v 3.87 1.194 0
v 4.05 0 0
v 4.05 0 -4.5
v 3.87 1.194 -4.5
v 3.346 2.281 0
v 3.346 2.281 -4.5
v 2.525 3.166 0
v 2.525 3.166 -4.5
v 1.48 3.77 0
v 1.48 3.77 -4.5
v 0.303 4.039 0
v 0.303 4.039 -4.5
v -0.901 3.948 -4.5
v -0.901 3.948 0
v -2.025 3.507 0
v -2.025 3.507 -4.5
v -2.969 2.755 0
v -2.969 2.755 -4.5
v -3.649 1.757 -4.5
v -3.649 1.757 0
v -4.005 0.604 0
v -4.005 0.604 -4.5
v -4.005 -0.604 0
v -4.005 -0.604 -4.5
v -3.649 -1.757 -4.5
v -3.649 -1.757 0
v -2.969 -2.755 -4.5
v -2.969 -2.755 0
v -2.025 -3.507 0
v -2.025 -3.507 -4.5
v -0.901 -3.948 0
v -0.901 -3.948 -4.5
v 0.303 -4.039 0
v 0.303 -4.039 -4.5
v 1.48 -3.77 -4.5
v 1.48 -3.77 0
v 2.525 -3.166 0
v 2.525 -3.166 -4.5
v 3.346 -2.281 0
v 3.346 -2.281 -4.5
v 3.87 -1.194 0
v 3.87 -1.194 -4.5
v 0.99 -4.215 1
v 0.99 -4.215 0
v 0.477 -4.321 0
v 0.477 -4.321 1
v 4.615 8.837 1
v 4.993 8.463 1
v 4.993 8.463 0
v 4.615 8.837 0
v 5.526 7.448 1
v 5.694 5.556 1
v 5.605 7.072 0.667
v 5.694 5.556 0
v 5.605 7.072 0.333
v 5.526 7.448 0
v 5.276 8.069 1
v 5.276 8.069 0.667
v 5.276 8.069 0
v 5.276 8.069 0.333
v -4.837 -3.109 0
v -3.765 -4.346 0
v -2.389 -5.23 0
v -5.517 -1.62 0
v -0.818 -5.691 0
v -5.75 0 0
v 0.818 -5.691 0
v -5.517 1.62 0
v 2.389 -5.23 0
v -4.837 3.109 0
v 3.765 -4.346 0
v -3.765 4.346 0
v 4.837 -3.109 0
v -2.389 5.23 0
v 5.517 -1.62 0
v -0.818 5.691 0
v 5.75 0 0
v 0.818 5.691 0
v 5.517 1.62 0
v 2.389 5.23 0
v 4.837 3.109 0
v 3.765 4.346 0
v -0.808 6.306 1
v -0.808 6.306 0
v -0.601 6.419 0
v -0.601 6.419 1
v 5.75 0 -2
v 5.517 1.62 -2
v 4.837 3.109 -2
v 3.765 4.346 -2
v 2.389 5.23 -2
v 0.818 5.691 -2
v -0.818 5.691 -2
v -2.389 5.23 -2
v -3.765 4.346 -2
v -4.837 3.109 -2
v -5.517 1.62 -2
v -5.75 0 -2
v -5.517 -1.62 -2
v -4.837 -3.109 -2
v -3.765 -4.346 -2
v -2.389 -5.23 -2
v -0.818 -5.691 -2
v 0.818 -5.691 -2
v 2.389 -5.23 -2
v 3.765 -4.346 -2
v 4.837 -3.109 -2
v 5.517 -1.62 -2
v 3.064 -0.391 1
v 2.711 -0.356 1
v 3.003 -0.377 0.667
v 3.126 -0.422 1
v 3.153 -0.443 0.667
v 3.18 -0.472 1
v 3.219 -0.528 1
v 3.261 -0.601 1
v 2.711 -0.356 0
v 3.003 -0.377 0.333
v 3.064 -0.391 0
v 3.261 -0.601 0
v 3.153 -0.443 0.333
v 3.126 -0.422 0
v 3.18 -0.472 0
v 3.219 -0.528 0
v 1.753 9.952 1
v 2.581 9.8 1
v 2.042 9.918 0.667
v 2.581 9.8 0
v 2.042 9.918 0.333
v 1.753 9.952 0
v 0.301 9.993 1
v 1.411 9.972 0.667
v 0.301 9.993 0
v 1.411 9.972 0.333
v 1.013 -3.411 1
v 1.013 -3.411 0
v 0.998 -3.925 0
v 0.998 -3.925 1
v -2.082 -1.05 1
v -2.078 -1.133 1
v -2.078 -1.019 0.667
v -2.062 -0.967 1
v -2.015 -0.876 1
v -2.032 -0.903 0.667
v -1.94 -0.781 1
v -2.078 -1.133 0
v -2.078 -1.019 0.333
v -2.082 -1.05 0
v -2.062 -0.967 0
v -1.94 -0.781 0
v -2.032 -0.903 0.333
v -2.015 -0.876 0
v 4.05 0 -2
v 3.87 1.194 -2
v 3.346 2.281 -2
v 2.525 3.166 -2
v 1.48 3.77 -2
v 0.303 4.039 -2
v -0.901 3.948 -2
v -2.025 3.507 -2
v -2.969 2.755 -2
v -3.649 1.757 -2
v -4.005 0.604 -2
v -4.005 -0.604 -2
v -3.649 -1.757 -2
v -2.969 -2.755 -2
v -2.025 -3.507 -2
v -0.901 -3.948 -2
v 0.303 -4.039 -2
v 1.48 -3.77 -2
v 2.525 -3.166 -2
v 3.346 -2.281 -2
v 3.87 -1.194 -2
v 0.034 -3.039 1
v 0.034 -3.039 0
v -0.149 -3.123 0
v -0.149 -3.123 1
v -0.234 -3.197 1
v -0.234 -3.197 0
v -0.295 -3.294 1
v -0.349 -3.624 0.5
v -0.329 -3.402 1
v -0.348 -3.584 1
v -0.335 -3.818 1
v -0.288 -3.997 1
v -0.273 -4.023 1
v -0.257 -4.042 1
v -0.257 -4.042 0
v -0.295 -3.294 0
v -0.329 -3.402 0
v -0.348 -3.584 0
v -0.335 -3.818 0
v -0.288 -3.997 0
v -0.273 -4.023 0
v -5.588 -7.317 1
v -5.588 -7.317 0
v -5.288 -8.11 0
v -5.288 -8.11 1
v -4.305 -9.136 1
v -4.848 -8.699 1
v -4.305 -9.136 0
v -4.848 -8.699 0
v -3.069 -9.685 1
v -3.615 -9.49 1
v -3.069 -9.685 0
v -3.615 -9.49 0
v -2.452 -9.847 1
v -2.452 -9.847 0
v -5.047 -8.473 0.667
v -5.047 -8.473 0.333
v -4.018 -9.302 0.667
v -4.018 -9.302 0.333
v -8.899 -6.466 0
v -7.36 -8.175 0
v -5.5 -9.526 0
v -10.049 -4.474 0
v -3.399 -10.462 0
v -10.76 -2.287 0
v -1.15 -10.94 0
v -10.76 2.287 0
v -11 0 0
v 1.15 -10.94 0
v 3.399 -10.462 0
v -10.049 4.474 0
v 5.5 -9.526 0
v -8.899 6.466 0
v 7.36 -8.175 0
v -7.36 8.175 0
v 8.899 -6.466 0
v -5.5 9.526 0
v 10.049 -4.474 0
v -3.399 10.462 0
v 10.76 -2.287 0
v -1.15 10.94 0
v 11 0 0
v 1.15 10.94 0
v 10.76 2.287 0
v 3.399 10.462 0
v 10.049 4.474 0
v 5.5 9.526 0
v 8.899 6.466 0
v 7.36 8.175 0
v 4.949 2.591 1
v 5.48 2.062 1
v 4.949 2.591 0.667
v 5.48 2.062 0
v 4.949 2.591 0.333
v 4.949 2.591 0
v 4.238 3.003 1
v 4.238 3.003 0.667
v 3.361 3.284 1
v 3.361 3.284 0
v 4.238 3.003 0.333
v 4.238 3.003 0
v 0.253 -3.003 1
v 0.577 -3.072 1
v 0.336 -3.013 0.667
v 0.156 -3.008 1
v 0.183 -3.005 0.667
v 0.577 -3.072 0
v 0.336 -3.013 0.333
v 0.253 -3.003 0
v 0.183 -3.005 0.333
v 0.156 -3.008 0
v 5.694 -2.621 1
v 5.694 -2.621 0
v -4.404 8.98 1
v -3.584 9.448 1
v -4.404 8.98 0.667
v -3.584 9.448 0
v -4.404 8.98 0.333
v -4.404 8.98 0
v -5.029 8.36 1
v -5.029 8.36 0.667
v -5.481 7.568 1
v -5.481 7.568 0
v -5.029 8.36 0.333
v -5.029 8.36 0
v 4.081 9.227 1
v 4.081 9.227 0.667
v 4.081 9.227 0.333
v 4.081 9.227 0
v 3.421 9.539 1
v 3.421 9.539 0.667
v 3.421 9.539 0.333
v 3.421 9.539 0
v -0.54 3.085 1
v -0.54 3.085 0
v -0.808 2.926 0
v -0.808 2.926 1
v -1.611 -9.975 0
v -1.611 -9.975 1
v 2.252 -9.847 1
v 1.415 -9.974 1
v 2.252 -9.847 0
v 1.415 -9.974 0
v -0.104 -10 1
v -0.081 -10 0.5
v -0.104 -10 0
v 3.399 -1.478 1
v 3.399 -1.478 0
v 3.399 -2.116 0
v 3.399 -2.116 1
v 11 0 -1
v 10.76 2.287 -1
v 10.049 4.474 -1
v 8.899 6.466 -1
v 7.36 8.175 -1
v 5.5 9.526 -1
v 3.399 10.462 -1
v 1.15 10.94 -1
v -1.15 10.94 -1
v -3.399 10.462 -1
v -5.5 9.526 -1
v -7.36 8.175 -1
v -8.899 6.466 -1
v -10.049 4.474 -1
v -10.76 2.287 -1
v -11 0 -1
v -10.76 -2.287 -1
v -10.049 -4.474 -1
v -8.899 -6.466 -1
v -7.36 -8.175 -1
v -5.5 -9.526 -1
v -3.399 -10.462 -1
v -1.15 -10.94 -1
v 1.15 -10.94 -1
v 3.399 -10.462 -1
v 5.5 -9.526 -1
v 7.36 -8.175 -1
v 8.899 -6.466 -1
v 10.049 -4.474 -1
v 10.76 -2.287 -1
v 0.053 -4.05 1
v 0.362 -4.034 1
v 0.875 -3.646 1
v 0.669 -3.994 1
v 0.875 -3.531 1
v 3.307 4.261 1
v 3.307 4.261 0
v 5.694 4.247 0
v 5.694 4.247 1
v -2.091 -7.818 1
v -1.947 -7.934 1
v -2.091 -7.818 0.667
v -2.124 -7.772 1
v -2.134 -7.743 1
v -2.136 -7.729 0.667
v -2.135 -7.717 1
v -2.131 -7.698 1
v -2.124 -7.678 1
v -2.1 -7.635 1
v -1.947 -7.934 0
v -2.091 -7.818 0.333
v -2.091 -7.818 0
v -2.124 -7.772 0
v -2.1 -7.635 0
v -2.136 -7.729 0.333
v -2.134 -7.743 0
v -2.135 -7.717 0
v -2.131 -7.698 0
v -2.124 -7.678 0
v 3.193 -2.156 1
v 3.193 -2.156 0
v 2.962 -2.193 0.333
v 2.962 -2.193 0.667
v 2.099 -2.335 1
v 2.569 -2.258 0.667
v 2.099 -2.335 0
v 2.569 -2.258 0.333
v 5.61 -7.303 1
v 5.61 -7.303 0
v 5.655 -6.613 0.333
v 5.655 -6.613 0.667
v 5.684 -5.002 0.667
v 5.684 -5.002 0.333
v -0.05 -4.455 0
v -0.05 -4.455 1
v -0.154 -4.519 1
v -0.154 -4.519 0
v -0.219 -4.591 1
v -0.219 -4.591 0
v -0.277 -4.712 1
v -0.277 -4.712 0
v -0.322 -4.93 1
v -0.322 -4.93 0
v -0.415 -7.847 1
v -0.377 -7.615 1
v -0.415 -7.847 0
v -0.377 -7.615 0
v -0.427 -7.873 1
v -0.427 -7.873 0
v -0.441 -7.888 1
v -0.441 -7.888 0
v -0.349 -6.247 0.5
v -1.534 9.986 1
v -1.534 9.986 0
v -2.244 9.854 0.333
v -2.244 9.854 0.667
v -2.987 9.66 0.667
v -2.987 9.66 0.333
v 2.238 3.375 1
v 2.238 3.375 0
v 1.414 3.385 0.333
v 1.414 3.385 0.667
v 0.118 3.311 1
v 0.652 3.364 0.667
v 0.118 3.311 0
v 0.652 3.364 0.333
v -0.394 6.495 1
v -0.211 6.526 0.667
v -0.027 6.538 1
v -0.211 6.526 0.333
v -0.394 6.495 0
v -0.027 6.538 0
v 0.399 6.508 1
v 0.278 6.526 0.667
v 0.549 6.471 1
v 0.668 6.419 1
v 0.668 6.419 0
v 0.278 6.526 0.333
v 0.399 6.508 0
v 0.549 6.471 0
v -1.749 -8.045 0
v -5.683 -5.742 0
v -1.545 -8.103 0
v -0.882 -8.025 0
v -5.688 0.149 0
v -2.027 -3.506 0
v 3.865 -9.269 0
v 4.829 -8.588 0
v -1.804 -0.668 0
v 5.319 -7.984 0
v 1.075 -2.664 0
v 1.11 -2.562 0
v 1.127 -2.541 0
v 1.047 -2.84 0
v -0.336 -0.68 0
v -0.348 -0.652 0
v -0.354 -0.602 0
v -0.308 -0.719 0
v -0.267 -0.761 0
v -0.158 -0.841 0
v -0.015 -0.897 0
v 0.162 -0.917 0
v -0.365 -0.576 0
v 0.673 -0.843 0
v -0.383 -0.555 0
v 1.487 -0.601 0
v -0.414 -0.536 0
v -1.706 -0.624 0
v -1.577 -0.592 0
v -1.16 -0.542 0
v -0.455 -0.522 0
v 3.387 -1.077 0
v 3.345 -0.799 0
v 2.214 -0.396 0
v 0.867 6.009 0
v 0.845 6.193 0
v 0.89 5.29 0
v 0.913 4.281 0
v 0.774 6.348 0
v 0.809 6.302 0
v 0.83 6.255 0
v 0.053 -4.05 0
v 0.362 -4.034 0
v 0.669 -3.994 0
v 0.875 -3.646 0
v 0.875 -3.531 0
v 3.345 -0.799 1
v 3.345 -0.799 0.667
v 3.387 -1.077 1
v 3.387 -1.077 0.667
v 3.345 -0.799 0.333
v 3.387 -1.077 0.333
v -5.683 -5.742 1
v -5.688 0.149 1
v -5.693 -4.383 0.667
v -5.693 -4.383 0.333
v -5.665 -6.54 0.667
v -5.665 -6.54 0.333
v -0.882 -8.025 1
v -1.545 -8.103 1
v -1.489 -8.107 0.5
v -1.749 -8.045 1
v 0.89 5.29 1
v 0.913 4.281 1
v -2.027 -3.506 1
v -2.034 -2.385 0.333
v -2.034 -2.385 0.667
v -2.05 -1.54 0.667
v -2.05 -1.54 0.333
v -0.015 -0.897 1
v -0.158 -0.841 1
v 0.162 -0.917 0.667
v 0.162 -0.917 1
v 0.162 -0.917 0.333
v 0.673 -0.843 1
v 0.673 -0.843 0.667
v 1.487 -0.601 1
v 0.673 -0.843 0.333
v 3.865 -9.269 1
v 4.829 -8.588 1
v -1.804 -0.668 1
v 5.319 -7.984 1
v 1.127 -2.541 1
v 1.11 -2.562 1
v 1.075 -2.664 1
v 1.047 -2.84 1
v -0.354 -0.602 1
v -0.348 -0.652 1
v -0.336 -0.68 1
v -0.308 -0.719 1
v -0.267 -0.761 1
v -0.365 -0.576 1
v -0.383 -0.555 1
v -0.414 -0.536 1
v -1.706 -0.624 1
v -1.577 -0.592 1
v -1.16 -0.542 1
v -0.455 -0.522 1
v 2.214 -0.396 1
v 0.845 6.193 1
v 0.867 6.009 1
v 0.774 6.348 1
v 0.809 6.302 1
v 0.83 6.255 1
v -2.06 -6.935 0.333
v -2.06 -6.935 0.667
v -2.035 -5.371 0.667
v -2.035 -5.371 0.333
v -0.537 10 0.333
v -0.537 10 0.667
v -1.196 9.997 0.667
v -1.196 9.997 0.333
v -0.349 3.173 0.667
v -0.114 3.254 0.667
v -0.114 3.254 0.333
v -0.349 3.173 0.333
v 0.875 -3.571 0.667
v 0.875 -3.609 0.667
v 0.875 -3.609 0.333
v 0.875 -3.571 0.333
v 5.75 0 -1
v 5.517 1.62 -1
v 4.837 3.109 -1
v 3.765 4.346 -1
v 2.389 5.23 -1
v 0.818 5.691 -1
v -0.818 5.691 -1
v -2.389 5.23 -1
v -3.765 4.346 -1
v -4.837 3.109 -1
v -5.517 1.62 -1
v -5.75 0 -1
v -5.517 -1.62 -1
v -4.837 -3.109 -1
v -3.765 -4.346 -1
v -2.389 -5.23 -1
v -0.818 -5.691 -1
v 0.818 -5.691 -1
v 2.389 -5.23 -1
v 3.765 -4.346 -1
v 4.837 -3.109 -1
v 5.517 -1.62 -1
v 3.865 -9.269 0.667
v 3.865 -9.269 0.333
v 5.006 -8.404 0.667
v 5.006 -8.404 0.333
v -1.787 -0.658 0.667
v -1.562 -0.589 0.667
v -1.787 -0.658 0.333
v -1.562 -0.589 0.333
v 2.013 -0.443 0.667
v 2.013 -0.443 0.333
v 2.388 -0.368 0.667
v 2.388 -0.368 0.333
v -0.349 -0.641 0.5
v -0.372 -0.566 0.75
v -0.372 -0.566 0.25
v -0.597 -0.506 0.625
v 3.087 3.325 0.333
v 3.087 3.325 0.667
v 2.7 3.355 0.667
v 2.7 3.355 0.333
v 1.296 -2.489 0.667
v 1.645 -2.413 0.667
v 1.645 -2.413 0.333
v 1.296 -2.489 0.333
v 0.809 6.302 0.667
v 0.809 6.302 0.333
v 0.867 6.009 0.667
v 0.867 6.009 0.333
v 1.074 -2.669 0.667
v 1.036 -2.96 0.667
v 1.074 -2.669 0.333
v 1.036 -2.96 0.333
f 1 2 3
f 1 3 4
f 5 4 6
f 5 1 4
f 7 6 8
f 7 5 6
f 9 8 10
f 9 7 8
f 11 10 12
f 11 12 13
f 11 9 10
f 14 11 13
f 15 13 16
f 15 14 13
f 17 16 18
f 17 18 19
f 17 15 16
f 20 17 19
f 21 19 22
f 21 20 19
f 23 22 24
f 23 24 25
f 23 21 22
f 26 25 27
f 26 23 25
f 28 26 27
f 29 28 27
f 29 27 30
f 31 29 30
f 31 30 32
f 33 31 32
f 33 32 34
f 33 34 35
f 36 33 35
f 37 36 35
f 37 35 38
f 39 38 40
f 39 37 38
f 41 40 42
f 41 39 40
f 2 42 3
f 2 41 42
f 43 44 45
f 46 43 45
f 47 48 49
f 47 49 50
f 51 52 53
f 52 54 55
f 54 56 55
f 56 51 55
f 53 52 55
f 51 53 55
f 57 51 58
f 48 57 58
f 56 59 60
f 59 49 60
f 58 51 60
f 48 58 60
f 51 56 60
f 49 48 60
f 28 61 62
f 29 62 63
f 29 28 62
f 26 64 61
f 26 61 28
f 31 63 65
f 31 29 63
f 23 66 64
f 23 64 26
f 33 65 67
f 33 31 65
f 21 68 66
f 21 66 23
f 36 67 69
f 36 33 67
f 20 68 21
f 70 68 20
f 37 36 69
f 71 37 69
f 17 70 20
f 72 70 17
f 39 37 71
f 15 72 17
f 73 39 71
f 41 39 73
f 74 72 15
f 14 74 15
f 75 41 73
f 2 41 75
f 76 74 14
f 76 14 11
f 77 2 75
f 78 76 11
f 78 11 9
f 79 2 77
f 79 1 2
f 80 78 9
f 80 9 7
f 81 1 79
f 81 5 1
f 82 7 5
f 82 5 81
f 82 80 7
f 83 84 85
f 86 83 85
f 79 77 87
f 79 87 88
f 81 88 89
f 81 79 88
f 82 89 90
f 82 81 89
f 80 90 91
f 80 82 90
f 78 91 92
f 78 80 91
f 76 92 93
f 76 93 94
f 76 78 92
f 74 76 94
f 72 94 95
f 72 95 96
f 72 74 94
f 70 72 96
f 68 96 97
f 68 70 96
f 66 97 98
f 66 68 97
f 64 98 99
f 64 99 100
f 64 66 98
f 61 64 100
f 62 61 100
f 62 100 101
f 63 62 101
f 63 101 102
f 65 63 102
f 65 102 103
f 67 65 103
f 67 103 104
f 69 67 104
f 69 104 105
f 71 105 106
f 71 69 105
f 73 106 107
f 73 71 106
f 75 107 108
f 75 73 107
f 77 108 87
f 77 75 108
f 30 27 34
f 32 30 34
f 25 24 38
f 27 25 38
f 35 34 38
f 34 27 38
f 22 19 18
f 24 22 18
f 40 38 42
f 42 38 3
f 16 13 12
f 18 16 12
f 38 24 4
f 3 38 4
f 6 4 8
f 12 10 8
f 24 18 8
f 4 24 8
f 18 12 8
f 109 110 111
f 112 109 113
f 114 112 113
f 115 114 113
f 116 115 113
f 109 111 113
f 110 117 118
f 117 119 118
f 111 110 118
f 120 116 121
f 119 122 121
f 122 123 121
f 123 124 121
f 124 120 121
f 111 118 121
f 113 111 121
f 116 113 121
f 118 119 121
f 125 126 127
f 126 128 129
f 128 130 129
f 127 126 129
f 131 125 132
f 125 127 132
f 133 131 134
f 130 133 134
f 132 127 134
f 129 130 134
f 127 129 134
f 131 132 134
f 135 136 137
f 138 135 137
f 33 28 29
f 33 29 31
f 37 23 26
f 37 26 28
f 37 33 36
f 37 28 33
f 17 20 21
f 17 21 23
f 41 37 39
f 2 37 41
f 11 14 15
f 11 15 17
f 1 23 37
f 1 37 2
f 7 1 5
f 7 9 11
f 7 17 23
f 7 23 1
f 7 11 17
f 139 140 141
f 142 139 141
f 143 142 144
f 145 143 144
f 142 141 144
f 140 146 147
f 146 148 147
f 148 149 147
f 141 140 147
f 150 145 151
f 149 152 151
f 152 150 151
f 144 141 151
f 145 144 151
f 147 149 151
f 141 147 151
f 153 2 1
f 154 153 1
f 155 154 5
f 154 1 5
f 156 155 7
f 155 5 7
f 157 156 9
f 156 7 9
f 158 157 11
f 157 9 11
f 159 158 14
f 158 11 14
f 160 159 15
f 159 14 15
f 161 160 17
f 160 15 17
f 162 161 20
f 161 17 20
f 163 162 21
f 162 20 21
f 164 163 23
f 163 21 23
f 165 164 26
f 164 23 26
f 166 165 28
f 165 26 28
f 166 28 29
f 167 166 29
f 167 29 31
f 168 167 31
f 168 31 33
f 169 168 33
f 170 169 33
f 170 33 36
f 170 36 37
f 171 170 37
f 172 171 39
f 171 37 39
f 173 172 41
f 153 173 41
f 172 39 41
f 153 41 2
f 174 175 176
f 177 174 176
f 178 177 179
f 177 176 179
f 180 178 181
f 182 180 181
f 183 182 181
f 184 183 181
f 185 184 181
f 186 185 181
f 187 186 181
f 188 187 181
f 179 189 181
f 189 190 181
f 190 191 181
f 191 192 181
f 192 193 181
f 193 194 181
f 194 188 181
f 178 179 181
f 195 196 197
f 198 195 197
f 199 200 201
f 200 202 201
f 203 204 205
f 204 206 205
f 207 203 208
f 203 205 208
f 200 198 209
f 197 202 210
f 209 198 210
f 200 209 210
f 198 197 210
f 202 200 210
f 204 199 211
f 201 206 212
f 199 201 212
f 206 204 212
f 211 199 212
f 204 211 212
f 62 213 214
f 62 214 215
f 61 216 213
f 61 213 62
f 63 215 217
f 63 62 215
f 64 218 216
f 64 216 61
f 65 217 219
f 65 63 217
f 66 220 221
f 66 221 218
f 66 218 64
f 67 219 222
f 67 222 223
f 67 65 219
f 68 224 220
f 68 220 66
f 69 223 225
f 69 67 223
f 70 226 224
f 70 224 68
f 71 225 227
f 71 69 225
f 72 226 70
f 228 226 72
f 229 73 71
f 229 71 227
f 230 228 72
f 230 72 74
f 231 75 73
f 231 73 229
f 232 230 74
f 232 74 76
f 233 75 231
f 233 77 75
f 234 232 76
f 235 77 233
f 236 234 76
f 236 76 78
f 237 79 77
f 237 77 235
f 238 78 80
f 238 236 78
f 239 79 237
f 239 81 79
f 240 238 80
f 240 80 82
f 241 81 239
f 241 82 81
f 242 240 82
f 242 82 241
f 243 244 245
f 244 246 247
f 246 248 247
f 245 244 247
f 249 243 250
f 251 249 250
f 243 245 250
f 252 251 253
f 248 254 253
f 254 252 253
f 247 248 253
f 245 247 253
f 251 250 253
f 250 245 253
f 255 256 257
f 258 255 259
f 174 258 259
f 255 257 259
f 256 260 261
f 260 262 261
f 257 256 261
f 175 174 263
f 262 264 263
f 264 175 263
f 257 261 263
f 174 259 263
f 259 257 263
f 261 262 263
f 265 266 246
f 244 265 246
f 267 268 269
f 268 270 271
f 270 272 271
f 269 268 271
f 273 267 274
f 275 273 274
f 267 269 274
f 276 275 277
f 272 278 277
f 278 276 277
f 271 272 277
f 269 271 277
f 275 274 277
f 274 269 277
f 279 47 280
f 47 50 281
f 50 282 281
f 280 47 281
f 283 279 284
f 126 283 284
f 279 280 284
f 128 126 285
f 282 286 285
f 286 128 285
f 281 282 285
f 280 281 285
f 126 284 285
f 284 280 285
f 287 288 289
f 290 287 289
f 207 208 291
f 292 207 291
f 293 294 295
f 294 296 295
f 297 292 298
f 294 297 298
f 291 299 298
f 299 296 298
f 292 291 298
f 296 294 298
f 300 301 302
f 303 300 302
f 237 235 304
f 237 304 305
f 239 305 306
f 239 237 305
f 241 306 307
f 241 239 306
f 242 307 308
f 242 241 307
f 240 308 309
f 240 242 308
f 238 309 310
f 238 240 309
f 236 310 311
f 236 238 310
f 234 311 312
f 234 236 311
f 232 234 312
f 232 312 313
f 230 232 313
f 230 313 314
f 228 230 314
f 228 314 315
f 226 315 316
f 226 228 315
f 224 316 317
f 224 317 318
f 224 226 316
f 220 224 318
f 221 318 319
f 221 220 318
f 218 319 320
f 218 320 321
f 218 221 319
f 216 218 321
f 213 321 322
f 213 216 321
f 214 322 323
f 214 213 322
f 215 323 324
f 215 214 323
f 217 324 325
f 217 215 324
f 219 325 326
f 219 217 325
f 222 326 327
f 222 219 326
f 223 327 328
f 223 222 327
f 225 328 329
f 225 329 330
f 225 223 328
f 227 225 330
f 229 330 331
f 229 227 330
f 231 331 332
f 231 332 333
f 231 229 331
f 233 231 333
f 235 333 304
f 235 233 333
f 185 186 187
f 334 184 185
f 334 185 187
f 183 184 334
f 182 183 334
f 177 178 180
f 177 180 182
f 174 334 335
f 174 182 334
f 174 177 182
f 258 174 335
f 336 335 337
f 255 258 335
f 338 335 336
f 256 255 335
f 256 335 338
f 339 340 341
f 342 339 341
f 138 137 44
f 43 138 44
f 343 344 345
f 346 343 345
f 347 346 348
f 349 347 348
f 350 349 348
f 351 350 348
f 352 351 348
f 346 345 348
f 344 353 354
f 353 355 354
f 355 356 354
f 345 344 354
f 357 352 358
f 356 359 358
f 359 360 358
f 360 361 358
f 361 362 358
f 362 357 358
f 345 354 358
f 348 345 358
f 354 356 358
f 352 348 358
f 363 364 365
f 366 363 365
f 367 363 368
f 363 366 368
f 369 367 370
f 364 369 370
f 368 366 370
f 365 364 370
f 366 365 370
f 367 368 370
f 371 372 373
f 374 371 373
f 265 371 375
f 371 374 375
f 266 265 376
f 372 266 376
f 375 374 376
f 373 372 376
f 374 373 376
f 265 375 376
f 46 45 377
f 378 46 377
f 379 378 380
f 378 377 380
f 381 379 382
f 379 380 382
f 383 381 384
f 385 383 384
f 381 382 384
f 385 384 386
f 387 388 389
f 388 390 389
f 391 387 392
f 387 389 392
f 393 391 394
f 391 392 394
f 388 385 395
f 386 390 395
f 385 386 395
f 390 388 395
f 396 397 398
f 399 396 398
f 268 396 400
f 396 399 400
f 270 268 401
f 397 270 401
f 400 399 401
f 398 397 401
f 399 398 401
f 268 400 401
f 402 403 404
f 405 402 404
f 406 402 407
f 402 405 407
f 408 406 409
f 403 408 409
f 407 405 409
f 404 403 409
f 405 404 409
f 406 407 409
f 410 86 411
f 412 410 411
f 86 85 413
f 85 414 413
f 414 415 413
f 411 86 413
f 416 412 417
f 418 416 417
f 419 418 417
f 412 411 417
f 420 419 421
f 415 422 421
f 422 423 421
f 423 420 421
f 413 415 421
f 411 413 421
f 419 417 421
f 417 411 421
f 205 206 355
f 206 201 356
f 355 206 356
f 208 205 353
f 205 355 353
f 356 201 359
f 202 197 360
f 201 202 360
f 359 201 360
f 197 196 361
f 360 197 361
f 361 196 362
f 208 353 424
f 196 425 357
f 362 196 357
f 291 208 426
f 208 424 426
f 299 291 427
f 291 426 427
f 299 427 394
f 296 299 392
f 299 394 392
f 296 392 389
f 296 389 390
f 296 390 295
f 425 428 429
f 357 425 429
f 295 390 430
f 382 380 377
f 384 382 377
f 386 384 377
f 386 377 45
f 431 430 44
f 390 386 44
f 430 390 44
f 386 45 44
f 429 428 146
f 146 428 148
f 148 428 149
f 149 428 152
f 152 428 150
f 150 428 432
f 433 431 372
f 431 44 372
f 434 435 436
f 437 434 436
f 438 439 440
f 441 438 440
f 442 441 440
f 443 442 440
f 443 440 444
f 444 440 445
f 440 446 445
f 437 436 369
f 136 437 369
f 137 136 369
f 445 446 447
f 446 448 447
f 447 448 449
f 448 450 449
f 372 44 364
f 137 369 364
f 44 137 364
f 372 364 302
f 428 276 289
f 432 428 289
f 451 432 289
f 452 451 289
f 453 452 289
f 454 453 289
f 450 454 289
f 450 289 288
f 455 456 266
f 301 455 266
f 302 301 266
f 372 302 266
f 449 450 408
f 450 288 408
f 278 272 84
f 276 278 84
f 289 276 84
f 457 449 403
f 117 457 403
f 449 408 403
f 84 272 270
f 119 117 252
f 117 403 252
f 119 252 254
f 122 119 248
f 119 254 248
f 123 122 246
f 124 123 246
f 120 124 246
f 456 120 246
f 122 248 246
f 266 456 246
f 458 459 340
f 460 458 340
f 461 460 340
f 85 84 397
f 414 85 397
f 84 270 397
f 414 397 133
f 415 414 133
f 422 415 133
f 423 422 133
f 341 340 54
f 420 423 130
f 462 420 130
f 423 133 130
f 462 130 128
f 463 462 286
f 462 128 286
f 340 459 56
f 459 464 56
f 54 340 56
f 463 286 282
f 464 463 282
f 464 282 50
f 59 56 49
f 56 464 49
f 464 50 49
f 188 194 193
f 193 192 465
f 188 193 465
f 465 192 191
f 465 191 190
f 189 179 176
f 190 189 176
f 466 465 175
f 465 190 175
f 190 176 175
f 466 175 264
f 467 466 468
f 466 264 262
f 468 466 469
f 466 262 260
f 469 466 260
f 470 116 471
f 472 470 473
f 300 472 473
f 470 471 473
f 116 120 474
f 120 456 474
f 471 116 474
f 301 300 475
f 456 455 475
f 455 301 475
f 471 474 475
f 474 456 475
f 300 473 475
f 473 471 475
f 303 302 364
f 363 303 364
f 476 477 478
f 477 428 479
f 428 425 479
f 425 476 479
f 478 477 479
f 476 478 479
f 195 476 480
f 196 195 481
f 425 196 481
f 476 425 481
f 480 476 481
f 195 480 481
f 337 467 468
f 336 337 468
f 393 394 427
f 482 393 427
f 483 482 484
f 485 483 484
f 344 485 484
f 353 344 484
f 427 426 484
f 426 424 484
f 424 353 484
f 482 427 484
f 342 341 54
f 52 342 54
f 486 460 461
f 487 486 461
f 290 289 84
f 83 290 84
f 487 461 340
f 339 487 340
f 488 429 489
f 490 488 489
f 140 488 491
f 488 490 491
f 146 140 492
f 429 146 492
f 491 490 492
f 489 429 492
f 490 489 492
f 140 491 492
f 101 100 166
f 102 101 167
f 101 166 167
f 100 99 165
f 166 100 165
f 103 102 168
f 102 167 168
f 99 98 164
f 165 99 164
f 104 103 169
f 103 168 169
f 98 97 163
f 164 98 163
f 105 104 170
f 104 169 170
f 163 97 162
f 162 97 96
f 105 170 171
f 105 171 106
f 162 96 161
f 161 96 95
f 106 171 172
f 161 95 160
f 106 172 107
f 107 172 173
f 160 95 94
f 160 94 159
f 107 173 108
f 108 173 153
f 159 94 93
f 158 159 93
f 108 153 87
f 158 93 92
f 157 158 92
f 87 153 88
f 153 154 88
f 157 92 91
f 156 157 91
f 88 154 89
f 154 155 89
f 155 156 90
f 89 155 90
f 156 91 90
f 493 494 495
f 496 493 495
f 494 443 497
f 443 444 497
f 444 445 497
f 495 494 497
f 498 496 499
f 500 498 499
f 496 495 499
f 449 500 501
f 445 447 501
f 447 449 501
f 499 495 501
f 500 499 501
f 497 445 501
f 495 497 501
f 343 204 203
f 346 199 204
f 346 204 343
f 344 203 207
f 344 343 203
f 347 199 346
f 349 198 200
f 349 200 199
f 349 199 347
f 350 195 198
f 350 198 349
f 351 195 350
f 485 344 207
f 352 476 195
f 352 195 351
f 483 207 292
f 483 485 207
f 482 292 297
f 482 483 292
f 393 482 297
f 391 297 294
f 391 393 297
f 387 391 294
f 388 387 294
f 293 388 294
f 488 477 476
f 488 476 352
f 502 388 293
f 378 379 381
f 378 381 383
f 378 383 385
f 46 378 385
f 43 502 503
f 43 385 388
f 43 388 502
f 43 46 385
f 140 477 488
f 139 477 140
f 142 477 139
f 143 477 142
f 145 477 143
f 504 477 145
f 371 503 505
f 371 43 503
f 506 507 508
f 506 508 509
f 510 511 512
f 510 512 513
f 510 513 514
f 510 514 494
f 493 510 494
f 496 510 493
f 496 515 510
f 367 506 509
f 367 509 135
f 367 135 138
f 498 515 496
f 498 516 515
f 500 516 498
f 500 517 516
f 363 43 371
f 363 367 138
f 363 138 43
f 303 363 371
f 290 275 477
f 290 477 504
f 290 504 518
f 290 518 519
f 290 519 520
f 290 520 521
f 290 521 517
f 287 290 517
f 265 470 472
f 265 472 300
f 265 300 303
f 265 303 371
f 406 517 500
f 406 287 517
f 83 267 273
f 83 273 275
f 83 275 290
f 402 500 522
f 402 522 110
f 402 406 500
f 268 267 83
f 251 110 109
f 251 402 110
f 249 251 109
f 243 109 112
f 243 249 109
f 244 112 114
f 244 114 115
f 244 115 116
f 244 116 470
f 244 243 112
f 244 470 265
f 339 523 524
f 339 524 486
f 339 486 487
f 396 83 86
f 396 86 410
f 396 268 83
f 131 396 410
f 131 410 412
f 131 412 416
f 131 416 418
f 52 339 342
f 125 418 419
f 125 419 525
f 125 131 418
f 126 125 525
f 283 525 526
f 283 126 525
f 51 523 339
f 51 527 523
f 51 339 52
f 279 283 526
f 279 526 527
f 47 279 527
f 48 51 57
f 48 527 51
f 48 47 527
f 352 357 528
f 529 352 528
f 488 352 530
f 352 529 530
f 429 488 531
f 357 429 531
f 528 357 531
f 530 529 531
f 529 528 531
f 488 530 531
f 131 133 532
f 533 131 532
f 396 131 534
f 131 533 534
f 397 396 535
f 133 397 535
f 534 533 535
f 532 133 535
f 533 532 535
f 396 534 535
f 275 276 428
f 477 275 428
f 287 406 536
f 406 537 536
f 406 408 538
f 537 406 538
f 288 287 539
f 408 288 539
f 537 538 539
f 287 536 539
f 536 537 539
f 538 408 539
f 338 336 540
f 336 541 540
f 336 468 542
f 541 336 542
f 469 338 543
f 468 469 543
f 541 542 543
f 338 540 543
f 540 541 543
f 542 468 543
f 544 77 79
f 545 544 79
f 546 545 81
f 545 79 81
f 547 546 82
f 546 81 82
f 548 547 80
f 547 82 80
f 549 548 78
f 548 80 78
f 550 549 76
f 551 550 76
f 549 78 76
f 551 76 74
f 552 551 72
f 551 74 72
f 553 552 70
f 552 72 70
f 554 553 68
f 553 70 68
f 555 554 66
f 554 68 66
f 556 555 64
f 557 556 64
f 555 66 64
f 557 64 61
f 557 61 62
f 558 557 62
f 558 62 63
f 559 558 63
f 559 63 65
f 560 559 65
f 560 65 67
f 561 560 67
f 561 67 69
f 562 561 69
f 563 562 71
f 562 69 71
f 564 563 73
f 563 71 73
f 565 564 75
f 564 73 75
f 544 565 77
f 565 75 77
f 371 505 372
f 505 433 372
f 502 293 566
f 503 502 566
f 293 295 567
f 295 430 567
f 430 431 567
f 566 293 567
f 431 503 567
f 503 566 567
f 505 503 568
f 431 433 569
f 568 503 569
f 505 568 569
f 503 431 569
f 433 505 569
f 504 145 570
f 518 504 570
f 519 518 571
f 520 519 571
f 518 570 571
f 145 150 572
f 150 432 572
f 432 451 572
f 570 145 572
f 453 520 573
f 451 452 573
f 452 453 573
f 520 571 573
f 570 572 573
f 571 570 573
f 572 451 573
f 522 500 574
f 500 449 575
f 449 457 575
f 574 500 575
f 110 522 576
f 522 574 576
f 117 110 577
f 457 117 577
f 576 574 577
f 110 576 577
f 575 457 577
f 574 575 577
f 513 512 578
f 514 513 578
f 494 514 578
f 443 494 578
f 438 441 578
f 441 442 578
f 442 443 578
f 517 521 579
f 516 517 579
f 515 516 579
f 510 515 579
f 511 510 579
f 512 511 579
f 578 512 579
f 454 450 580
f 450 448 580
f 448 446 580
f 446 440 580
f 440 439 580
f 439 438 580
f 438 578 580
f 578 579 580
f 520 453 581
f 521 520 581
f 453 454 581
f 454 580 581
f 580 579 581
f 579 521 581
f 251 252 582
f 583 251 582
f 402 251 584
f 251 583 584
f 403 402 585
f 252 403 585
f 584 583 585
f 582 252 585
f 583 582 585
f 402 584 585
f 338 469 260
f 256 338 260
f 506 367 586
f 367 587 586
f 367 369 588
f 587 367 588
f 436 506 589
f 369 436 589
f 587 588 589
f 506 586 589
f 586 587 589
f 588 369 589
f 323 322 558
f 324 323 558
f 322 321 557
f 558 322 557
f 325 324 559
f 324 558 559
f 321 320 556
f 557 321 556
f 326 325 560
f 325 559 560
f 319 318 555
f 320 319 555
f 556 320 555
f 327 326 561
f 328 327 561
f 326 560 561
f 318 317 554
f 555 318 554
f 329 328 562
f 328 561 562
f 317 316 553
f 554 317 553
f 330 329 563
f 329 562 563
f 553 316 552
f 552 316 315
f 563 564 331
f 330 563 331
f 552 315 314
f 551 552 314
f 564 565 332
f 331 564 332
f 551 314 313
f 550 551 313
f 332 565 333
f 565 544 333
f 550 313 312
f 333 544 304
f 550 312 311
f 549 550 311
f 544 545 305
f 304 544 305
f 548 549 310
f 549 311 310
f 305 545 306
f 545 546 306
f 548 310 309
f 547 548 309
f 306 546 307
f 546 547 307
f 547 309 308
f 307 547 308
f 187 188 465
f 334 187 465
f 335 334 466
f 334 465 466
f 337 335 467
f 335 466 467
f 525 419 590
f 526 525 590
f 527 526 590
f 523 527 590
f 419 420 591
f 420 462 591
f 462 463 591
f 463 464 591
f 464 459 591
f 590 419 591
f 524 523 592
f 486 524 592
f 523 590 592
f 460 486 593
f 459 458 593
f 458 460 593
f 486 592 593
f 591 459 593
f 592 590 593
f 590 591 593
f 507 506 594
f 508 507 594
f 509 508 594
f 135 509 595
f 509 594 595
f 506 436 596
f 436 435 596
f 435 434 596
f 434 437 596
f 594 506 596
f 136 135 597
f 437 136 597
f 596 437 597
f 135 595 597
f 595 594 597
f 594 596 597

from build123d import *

# Parameters (mm, degrees)
F0_R     = 5.75
F0_R_2   = 4.05
F1_DEPTH = 2
F0_R_3   = 11
F2_DEPTH = 1
F3_DEPTH = 4.5
F5_DEPTH = 1


with BuildPart() as f1:
    # F0 (on Top) → F1 (new body)
    with BuildSketch(Plane.XY):
        Circle(F0_R)
        Circle(F0_R_2, mode=Mode.SUBTRACT)
    extrude(amount=-F1_DEPTH)


with BuildPart() as f2:
    # F0 (on Top) → F2 (new body)
    with BuildSketch(Plane.XY):
        Circle(F0_R_3)
        Circle(F0_R, mode=Mode.SUBTRACT)
    extrude(amount=-F2_DEPTH)


with BuildPart() as f3:
    # F0 (on Top) → F3 (new body)
    with BuildSketch(Plane.XY):
        Circle(F0_R_2)
    extrude(amount=-F3_DEPTH)


with BuildPart() as f5:
    # F4 (on face) → F5 (new body)
    with BuildSketch(Plane.XY):
        with BuildLine():
            add(Edge.make_bspline(
                [(-3.584369, 9.448104), (-4.509891, 9.049578), (-5.106509, 8.451788), (-5.481308, 7.568387)],
                knots=[0, 0, 0, 0, 1, 1, 1, 1], degree=3))
            Line((-5.481308, 7.568387), (-5.687829, 0.149149))
            add(Edge.make_bspline(
                [(-5.687829, 0.149149), (-5.703127, -5.901815), (-5.695478, -6.898131), (-5.588393, -7.316584)],
                knots=[0, 0, 0, 0, 1, 1, 1, 1], degree=3))
            add(Edge.make_bspline(
                [(-5.588393, -7.316584), (-5.274786, -8.651649), (-4.30337, -9.428776), (-2.452324, -9.847229)],
                knots=[0, 0, 0, 0, 1, 1, 1, 1], degree=3))
            add(Edge.make_bspline(
                [(-2.452324, -9.847229), (-1.83276, -9.986713), (-1.595642, -9.999997), (-0.081151, -9.999997)],
                knots=[0, 0, 0, 0, 1, 1, 1, 1], degree=3))
            add(Edge.make_bspline(
                [(-0.081151, -9.999997), (1.418043, -9.999997), (1.670458, -9.980071), (2.251778, -9.847229)],
                knots=[0, 0, 0, 0, 1, 1, 1, 1], degree=3))
            add(Edge.make_bspline(
                [(2.251778, -9.847229), (4.079877, -9.428776), (5.29606, -8.505522), (5.609666, -7.3033)],
                knots=[0, 0, 0, 0, 1, 1, 1, 1], degree=3))
            add(Edge.make_bspline(
                [(5.609666, -7.3033), (5.663209, -7.123963), (5.693805, -5.337235), (5.693805, -2.620612)],
                knots=[0, 0, 0, 0, 1, 1, 1, 1], degree=3))
            Line((5.693805, -2.620612), (5.479634, 2.062077))
            add(Edge.make_bspline(
                [(5.479634, 2.062077), (5.043644, 2.646583), (4.316994, 3.071678), (3.360876, 3.284225)],
                knots=[0, 0, 0, 0, 1, 1, 1, 1], degree=3))
            add(Edge.make_bspline(
                [(3.360876, 3.284225), (3.1553689934, 3.3294673822), (2.7253242209, 3.360442913), (2.238191116, 3.3753519118)],
                knots=[0, 0, 0, 0, 0.378413675, 0.378413675, 0.378413675, 0.378413675], degree=3))
            ThreePointArc((2.238191116, 3.3753519118), (3.5684151958, 1.9154406778), (4.05, 0))
            ThreePointArc((4.05, 0), (3.1972082334, -2.4860328864), (0.9979706111, -3.9251184262))
            Line((0.9979706111, -3.9251184262), (0.989702, -4.214718))
            Line((0.989702, -4.214718), (0.477223, -4.320992))
            add(Edge.make_bspline(
                [(0.477223, -4.320992), (-0.387109, -4.500329), (-0.348864, -4.420624), (-0.348864, -6.247204)],
                knots=[0, 0, 0, 0, 1, 1, 1, 1], degree=3))
            add(Edge.make_bspline(
                [(-0.348864, -6.247204), (-0.348864, -7.4295), (-0.371811, -7.841311), (-0.440651, -7.887806)],
                knots=[0, 0, 0, 0, 1, 1, 1, 1], degree=3))
            add(Edge.make_bspline(
                [(-0.440651, -7.887806), (-0.570683, -7.974153), (-1.197897, -8.106996), (-1.488557, -8.106996)],
                knots=[0, 0, 0, 0, 1, 1, 1, 1], degree=3))
            add(Edge.make_bspline(
                [(-1.488557, -8.106996), (-1.618589, -8.106996), (-1.809813, -8.033932), (-1.947494, -7.934301)],
                knots=[0, 0, 0, 0, 1, 1, 1, 1], degree=3))
            add(Edge.make_bspline(
                [(-1.947494, -7.934301), (-2.146366, -7.794816), (-2.169313, -7.74168), (-2.100473, -7.635406)],
                knots=[0, 0, 0, 0, 1, 1, 1, 1], degree=3))
            add(Edge.make_bspline(
                [(-2.100473, -7.635406), (-2.0543800597, -7.5553552956), (-2.0249525069, -5.3335056257), (-2.0272542069, -3.5061004522)],
                knots=[0, 0, 0, 0, 0.6026008669, 0.6026008669, 0.6026008669, 0.6026008669], degree=3))
            ThreePointArc((-2.0272542069, -3.5061004522), (-3.9971554901, 0.652110411), (-0.807801, 3.9686216177))
            Line((-0.807801, 3.9686216177), (-0.807801, 4.612647))
            Line((-0.807801, 4.612647), (-0.807801, 6.306386))
            Line((-0.807801, 6.306386), (-0.601279, 6.419302))
            add(Edge.make_bspline(
                [(-0.601279, 6.419302), (-0.325917, 6.578712), (0.393084, 6.578712), (0.668446, 6.419302)],
                knots=[0, 0, 0, 0, 1, 1, 1, 1], degree=3))
            add(Edge.make_bspline(
                [(0.668446, 6.419302), (0.867319, 6.306386), (0.867319, 6.306386), (0.890266, 5.290143)],
                knots=[0, 0, 0, 0, 1, 1, 1, 1], degree=3))
            Line((0.890266, 5.290143), (5.693805, 5.555827))
            add(Edge.make_bspline(
                [(5.693805, 5.555827), (5.693805, 7.428903), (5.471985, 8.086472), (4.615303, 8.83703)],
                knots=[0, 0, 0, 0, 1, 1, 1, 1], degree=3))
            add(Edge.make_bspline(
                [(4.615303, 8.83703), (4.125771, 9.27541), (3.529153, 9.554378), (2.580683, 9.800136)],
                knots=[0, 0, 0, 0, 1, 1, 1, 1], degree=3))
            add(Edge.make_bspline(
                [(2.580683, 9.800136), (1.961118, 9.959547), (1.777544, 9.979473), (0.301297, 9.992758)],
                knots=[0, 0, 0, 0, 1, 1, 1, 1], degree=3))
            add(Edge.make_bspline(
                [(0.301297, 9.992758), (-0.578332, 10.006042), (-1.404419, 9.9994), (-1.534451, 9.986116)],
                knots=[0, 0, 0, 0, 1, 1, 1, 1], degree=3))
            add(Edge.make_bspline(
                [(-1.534451, 9.986116), (-2.169313, 9.899768), (-3.117783, 9.65401), (-3.584369, 9.448104)],
                knots=[0, 0, 0, 0, 1, 1, 1, 1], degree=3))
        make_face()
        Polygon((5.693805, 4.247331), (5.693805, 5.555827), (0.890266, 5.290143), (0.913213, 4.280542), (3.307333, 4.260616), align=None)
        with BuildLine():
            ThreePointArc((4.05, 0), (3.5684151958, 1.9154406778), (2.238191116, 3.3753519118))
            add(Edge.make_bspline(
                [(2.238191116, 3.3753519118), (1.4380210999, 3.3998415916), (0.4838170762, 3.3809810415), (0.117722, 3.310794)],
                knots=[0.378413675, 0.378413675, 0.378413675, 0.378413675, 1, 1, 1, 1], degree=3))
            add(Edge.make_bspline(
                [(0.117722, 3.310794), (-0.096449, 3.270941), (-0.387109, 3.171309), (-0.540087, 3.084962)],
                knots=[0, 0, 0, 0, 1, 1, 1, 1], degree=3))
            Line((-0.540087, 3.084962), (-0.807801, 2.925551))
            Line((-0.807801, 2.925551), (-0.807801, 3.9686216177))
            ThreePointArc((-0.807801, 3.9686216177), (-3.9971554901, 0.652110411), (-2.0272542069, -3.5061004522))
            add(Edge.make_bspline(
                [(-2.0272542069, -3.5061004522), (-2.0287721164, -2.3009756809), (-2.0440892343, -1.2673967641), (-2.077526, -1.132779)],
                knots=[0.6026008669, 0.6026008669, 0.6026008669, 0.6026008669, 1, 1, 1, 1], degree=3))
            add(Edge.make_bspline(
                [(-2.077526, -1.132779), (-2.100473, -1.019863), (-2.054579, -0.906947), (-1.939845, -0.780747)],
                knots=[0, 0, 0, 0, 1, 1, 1, 1], degree=3))
            add(Edge.make_bspline(
                [(-1.939845, -0.780747), (-1.786866, -0.621336), (-1.68743, -0.588126), (-1.159652, -0.541631)],
                knots=[0, 0, 0, 0, 1, 1, 1, 1], degree=3))
            add(Edge.make_bspline(
                [(-1.159652, -0.541631), (-0.509492, -0.47521), (-0.348864, -0.495136), (-0.348864, -0.641263)],
                knots=[0, 0, 0, 0, 1, 1, 1, 1], degree=3))
            add(Edge.make_bspline(
                [(-0.348864, -0.641263), (-0.348864, -0.687757), (-0.264725, -0.780747), (-0.15764, -0.840526)],
                knots=[0, 0, 0, 0, 1, 1, 1, 1], degree=3))
            add(Edge.make_bspline(
                [(-0.15764, -0.840526), (0.102424, -0.986652), (0.484872, -0.933515), (1.486884, -0.60141)],
                knots=[0, 0, 0, 0, 1, 1, 1, 1], degree=3))
            add(Edge.make_bspline(
                [(1.486884, -0.60141), (2.121746, -0.395504), (2.38181, -0.342368), (2.710715, -0.355652)],
                knots=[0, 0, 0, 0, 1, 1, 1, 1], degree=3))
            add(Edge.make_bspline(
                [(2.710715, -0.355652), (3.108461, -0.368936), (3.139056, -0.38222), (3.261439, -0.60141)],
                knots=[0, 0, 0, 0, 1, 1, 1, 1], degree=3))
            add(Edge.make_bspline(
                [(3.261439, -0.60141), (3.368525, -0.774105), (3.399121, -0.999937), (3.399121, -1.478169)],
                knots=[0, 0, 0, 0, 1, 1, 1, 1], degree=3))
            Line((3.399121, -1.478169), (3.399121, -2.115811))
            Line((3.399121, -2.115811), (3.192599, -2.155664))
            add(Edge.make_bspline(
                [(3.192599, -2.155664), (3.070216, -2.17559), (2.580683, -2.255296), (2.098799, -2.335001)],
                knots=[0, 0, 0, 0, 1, 1, 1, 1], degree=3))
            add(Edge.make_bspline(
                [(2.098799, -2.335001), (1.616916, -2.408064), (1.180926, -2.507696), (1.127383, -2.540906)],
                knots=[0, 0, 0, 0, 1, 1, 1, 1], degree=3))
            add(Edge.make_bspline(
                [(1.127383, -2.540906), (1.066192, -2.587401), (1.027947, -2.879654), (1.012649, -3.411023)],
                knots=[0, 0, 0, 0, 1, 1, 1, 1], degree=3))
            Line((1.012649, -3.411023), (0.9979706111, -3.9251184262))
            ThreePointArc((0.9979706111, -3.9251184262), (3.1972082334, -2.4860328864), (4.05, 0))
        make_face()
    extrude(amount=F5_DEPTH)


with BuildPart() as f5b:
    # F4 (on face) → F5, piece 2 (new body)
    with BuildSketch(Plane.XY):
        with BuildLine():
            add(Edge.make_bspline(
                [(-0.348864, -3.623571), (-0.348864, -3.809276143), (-0.3107315498, -3.9949812859), (-0.2573124292, -4.0418176992)],
                knots=[0, 0, 0, 0, 0.9985274841, 0.9985274841, 0.9985274841, 0.9985274841], degree=3))
            ThreePointArc((-0.2573124292, -4.0418176992), (0.2074378073, -4.0446841108), (0.6694563399, -3.9942869462))
            Line((0.6694563399, -3.9942869462), (0.8745343363, -3.6457520987))
            add(Edge.make_bspline(
                [(0.8745343363, -3.6457520987), (0.8748884536, -3.6100955301), (0.874968, -3.5717715771), (0.874968, -3.530581)],
                knots=[0.9278904225, 0.9278904225, 0.9278904225, 0.9278904225, 1, 1, 1, 1], degree=3))
            Line((0.874968, -3.530581), (0.576659, -3.072275))
            add(Edge.make_bspline(
                [(0.576659, -3.072275), (0.263052, -2.985928), (0.209509, -2.985928), (0.033584, -3.039065)],
                knots=[0, 0, 0, 0, 1, 1, 1, 1], degree=3))
            add(Edge.make_bspline(
                [(0.033584, -3.039065), (-0.249427, -3.132054), (-0.348864, -3.278181), (-0.348864, -3.623571)],
                knots=[0, 0, 0, 0, 1, 1, 1, 1], degree=3))
        make_face()
    extrude(amount=F5_DEPTH)


solid = Compound([f1.part, f2.part, f3.part, f5.part, f5b.part])
